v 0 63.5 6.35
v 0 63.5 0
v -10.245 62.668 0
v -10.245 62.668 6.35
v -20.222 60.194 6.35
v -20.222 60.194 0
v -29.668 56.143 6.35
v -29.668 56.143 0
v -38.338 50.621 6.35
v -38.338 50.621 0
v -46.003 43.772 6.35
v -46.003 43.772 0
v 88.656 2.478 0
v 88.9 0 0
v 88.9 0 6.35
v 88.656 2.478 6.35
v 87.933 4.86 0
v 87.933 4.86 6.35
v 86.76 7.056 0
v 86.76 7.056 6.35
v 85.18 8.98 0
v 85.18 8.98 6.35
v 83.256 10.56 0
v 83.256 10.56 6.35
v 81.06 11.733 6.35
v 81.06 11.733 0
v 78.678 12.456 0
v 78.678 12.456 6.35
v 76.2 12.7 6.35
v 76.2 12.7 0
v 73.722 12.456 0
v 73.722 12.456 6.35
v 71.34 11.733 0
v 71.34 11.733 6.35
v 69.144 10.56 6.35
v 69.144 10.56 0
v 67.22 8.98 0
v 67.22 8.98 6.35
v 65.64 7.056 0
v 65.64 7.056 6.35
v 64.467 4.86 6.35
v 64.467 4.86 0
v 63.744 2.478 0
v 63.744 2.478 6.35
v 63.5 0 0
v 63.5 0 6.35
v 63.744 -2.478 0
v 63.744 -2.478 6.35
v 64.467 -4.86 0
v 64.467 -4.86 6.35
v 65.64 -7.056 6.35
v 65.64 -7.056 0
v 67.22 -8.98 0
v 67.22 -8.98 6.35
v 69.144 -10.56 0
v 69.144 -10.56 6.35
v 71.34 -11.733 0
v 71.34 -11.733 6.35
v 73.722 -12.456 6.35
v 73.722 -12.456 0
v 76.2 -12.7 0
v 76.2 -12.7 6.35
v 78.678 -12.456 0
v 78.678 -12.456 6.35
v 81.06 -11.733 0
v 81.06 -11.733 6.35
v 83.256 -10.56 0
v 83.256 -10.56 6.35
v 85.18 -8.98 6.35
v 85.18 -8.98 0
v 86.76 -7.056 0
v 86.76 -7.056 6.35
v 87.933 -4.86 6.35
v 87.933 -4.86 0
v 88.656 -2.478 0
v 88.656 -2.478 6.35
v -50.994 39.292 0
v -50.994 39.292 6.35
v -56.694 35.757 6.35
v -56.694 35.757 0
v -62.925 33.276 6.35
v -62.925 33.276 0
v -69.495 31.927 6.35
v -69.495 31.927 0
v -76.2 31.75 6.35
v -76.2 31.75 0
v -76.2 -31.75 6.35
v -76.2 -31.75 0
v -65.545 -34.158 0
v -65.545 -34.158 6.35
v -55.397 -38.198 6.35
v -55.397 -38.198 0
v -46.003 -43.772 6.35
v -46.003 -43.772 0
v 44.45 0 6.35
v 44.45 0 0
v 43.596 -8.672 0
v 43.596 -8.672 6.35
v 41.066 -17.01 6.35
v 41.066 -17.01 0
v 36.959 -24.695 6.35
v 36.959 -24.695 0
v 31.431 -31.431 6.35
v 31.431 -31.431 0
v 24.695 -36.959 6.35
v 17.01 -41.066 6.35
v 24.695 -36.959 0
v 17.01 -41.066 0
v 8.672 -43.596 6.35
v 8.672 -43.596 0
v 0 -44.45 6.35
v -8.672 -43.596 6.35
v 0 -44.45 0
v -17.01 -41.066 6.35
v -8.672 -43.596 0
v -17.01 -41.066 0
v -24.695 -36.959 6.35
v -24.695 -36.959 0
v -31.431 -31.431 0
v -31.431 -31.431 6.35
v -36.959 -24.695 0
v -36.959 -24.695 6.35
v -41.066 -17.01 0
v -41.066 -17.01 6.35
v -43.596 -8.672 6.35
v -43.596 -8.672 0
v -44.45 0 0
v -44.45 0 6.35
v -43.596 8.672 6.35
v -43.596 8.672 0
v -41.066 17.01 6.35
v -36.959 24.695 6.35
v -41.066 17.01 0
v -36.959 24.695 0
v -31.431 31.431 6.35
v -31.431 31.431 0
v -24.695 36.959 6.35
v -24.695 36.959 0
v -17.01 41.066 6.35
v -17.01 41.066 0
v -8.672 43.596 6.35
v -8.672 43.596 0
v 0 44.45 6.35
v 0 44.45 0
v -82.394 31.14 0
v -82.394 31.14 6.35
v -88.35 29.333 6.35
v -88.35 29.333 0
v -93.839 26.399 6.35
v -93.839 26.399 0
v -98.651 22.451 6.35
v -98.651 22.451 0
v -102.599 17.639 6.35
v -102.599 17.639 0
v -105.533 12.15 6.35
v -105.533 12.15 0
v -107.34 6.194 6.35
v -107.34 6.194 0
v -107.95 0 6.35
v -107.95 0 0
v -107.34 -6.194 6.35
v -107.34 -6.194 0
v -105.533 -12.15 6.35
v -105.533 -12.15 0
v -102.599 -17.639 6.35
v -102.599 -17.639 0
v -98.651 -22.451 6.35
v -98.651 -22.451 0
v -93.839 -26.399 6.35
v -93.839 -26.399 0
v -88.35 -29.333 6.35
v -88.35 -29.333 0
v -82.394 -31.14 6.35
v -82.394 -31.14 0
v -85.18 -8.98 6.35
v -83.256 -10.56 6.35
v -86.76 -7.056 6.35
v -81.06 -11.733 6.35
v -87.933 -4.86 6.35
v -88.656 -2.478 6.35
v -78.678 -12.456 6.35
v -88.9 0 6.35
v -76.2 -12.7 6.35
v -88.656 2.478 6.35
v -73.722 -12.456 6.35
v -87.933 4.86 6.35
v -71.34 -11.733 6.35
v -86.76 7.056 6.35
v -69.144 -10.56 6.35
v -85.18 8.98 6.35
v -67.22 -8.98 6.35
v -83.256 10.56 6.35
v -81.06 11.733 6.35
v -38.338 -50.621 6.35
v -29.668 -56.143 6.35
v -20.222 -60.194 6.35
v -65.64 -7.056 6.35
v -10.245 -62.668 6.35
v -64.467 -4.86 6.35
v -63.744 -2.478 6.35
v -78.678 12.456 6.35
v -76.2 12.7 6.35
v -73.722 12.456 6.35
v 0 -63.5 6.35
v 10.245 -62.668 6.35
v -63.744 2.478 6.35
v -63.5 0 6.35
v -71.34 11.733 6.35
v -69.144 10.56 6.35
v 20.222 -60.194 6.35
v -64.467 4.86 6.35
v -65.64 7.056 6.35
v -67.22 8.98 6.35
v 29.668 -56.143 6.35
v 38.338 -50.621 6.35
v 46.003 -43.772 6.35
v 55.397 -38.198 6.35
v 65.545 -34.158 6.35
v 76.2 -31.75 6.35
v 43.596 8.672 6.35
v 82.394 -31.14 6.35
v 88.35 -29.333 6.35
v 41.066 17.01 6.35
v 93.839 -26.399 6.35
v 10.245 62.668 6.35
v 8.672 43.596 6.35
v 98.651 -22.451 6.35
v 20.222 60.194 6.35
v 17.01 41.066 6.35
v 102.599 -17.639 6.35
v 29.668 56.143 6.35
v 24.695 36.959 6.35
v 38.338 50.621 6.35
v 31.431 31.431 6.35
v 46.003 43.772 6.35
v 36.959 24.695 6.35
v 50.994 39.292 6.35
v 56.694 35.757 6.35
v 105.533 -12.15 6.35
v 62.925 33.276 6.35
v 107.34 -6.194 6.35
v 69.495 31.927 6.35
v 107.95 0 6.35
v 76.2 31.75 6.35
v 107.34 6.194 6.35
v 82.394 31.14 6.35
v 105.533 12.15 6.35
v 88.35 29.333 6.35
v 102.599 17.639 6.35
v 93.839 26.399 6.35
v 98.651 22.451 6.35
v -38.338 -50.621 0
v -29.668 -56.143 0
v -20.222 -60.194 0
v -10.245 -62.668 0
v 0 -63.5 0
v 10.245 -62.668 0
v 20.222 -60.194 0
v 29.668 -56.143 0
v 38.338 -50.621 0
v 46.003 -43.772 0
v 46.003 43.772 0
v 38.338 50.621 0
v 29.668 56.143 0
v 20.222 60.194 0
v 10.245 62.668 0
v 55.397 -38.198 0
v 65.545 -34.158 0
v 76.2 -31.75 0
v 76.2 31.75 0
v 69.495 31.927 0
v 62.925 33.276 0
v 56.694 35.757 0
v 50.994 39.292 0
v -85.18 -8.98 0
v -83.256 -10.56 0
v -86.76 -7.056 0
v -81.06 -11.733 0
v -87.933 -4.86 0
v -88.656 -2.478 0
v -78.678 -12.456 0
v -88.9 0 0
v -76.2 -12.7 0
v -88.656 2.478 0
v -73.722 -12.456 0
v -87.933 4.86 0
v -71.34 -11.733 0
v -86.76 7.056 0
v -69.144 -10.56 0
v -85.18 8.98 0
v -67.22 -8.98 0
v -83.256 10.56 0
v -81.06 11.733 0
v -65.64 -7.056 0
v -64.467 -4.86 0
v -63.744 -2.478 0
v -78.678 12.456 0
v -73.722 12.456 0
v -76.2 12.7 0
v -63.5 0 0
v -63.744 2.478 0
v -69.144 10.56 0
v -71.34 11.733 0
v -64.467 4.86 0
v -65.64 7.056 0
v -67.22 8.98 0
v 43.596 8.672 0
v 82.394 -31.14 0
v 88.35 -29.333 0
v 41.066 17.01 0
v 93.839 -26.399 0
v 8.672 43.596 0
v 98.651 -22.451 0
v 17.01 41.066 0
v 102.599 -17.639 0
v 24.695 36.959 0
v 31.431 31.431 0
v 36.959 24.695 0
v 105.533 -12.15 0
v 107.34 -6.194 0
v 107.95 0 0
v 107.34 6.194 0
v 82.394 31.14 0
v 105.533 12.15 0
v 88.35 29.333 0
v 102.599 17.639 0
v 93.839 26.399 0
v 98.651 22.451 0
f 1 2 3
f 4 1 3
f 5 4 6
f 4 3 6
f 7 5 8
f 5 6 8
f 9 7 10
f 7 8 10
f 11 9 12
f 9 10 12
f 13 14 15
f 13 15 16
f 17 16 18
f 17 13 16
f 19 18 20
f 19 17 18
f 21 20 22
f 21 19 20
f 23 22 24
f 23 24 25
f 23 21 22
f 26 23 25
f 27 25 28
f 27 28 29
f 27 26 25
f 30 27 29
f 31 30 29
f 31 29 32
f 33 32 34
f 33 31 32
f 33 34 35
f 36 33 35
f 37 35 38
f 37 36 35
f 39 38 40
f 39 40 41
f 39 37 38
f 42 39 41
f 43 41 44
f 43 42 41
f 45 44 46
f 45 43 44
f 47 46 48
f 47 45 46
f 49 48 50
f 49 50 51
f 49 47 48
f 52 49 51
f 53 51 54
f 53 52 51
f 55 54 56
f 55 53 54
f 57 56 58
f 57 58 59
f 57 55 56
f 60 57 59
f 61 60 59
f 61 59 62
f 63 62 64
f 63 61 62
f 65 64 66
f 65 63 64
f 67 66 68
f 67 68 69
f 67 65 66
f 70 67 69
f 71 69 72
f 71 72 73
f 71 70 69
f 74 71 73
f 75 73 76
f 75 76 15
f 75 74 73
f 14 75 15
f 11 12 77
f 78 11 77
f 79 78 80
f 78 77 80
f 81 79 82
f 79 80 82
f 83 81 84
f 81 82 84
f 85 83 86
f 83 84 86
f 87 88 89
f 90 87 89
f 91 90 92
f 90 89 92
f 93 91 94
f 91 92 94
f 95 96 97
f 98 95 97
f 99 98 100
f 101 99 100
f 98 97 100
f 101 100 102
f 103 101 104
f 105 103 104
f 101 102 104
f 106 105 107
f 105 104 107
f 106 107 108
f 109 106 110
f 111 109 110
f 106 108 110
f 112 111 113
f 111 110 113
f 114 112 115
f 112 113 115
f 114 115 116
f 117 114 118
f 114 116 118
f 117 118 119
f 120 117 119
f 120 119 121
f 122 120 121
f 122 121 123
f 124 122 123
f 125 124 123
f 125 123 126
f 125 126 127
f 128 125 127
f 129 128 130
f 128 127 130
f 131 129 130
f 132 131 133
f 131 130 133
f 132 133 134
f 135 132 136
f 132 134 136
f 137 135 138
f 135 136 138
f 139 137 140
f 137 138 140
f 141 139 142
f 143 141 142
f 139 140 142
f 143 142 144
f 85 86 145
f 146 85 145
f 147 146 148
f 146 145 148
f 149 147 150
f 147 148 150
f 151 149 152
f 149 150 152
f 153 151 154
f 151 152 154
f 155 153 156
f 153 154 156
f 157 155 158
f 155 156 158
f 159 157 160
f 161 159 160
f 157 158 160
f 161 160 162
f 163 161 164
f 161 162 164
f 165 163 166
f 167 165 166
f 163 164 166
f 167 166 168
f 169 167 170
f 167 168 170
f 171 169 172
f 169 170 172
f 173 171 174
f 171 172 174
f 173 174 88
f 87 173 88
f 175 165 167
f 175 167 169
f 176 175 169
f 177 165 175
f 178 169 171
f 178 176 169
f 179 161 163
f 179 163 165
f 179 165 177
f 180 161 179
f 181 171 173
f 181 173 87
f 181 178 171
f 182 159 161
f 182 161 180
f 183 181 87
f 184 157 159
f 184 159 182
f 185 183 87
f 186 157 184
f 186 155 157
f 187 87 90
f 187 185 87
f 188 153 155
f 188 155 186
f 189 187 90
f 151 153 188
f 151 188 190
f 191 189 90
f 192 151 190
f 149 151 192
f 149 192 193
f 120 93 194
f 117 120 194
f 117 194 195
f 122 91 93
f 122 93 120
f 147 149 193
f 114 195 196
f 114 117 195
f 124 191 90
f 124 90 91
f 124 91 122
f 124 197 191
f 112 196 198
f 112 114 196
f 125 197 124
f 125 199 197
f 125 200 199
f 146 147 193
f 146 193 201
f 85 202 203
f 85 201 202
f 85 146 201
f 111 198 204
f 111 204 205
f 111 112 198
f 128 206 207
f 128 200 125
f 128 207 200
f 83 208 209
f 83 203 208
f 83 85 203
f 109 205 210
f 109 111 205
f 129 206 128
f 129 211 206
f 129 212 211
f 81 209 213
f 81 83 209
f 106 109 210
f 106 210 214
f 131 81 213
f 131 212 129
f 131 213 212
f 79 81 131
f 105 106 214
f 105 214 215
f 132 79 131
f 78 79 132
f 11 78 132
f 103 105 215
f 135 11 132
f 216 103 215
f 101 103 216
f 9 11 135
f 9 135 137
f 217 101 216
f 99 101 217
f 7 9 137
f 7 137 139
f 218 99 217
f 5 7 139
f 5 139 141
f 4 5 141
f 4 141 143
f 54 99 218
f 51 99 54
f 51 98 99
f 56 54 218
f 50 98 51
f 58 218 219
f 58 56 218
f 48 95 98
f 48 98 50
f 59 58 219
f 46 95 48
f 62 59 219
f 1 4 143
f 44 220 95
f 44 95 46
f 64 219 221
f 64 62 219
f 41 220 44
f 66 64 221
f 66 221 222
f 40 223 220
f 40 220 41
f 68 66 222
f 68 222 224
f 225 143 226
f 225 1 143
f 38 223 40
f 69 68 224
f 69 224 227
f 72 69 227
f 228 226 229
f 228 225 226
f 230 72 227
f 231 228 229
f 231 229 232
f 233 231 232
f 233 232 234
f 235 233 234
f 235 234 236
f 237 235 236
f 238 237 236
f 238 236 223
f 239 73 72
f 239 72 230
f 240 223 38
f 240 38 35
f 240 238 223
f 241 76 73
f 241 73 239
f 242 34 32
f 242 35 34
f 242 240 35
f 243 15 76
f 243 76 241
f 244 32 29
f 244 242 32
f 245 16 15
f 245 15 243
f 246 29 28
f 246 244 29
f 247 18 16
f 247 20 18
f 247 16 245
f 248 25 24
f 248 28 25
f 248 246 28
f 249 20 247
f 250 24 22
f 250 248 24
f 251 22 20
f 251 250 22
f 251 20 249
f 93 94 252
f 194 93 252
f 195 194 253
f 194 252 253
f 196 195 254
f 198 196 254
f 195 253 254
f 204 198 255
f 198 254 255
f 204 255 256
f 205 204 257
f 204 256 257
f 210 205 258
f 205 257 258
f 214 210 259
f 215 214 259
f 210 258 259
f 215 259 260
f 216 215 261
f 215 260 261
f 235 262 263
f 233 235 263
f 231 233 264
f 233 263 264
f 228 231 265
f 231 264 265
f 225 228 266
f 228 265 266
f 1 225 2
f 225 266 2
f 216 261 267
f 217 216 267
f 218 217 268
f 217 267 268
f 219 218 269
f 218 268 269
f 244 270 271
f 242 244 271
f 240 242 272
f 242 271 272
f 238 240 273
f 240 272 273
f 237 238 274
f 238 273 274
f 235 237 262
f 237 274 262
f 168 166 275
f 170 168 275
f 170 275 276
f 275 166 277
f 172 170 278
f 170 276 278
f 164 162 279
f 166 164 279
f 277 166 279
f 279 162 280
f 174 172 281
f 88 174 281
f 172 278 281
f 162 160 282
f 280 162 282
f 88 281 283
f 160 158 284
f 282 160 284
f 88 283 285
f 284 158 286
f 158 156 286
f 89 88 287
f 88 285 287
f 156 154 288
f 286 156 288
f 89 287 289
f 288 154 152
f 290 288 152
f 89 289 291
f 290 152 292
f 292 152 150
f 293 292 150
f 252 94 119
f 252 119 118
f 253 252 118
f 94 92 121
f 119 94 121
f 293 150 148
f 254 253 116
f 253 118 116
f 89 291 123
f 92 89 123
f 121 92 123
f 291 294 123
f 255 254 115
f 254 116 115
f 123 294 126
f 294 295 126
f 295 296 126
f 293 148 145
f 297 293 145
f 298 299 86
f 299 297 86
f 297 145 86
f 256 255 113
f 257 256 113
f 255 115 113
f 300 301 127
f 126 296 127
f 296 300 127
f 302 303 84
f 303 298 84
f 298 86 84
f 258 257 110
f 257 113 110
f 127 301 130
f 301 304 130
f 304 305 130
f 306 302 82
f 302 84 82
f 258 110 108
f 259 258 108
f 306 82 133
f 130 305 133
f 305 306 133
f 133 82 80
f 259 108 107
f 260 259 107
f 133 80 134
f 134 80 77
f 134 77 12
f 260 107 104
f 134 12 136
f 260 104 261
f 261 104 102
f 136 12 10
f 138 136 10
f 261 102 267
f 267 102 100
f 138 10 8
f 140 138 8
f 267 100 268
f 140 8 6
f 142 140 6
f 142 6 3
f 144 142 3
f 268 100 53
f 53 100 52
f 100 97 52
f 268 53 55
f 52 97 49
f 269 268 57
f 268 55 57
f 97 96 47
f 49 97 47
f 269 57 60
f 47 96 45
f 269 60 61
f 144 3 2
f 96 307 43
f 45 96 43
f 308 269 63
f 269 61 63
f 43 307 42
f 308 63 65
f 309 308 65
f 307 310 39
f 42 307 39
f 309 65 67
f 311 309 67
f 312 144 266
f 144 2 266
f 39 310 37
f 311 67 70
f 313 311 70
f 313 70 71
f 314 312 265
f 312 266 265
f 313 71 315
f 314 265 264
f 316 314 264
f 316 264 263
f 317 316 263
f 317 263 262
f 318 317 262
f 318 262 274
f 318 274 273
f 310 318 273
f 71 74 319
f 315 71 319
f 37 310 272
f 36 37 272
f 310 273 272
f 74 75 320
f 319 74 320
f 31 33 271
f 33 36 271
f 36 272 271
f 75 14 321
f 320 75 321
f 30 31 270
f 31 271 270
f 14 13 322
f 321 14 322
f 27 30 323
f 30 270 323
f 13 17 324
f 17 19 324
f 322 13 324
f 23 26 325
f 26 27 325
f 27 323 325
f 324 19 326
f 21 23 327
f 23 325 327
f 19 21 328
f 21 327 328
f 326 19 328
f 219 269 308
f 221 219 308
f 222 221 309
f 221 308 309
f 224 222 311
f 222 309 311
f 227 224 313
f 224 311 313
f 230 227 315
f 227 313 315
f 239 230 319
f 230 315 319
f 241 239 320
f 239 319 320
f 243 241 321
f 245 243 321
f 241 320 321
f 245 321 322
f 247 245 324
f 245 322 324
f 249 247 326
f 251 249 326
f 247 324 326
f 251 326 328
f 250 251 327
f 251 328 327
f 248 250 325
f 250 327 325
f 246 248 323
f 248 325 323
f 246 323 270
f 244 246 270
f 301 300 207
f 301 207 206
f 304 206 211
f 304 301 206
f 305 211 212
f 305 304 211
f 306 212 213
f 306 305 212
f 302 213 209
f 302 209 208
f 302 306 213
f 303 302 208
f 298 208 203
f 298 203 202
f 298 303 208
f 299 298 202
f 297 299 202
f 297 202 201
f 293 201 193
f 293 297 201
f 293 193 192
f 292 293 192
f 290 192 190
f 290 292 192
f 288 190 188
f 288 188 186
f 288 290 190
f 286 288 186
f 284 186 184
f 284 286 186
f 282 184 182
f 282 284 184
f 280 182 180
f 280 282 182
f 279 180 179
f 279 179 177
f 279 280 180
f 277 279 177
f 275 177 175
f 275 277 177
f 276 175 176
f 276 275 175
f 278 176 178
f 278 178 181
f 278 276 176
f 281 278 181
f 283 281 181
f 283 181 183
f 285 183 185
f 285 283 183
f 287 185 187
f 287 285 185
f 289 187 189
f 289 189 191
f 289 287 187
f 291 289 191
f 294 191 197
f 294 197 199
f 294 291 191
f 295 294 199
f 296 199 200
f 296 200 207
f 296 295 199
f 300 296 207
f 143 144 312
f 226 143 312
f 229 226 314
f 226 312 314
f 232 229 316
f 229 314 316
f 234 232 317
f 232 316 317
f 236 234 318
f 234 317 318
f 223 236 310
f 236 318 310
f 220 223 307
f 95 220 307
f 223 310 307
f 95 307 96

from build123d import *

# Parameters (mm, degrees)
F0_R     = 12.7
F1_DEPTH = 6.35


# Not quite as in the source:
# - a feature names something its author has since deleted; it is built from what else it names


with BuildPart() as f1:
    # F0 (on Top) → F1 (new body)
    with BuildSketch(Plane.XY):
        with BuildLine():
            ThreePointArc((46.002574141, 43.7722877218), (25.0270826273, 58.3600474226), (0, 63.5))
            ThreePointArc((0, 63.5), (-25.0270826273, 58.3600474226), (-46.002574141, 43.7722877218))
            ThreePointArc((-46.002574141, 43.7722877218), (-59.7549711548, 34.379485063), (-76.2, 31.75))
            ThreePointArc((-76.2, 31.75), (-107.95, 0), (-76.2, -31.75))
            ThreePointArc((-76.2, -31.75), (-60.3918607808, -35.9792161379), (-46.002574141, -43.7722877218))
            ThreePointArc((-46.002574141, -43.7722877218), (0, -63.5), (46.002574141, -43.7722877218))
            ThreePointArc((46.002574141, -43.7722877218), (60.3918607808, -35.9792161379), (76.2, -31.75))
            ThreePointArc((76.2, -31.75), (107.95, 0), (76.2, 31.75))
            ThreePointArc((76.2, 31.75), (59.7549711548, 34.379485063), (46.002574141, 43.7722877218))
        make_face()
        with Locations((-76.2, 0)):
            Circle(F0_R, mode=Mode.SUBTRACT)
        with BuildLine():
            ThreePointArc((0, 44.45), (31.4308964237, 31.4308964237), (44.45, 0))
            ThreePointArc((44.45, 0), (-31.4308964237, -31.4308964237), (0, 44.45))
        make_face(mode=Mode.SUBTRACT)
        with Locations((76.2, 0)):
            Circle(F0_R, mode=Mode.SUBTRACT)
    extrude(amount=F1_DEPTH)


solid = f1.part
